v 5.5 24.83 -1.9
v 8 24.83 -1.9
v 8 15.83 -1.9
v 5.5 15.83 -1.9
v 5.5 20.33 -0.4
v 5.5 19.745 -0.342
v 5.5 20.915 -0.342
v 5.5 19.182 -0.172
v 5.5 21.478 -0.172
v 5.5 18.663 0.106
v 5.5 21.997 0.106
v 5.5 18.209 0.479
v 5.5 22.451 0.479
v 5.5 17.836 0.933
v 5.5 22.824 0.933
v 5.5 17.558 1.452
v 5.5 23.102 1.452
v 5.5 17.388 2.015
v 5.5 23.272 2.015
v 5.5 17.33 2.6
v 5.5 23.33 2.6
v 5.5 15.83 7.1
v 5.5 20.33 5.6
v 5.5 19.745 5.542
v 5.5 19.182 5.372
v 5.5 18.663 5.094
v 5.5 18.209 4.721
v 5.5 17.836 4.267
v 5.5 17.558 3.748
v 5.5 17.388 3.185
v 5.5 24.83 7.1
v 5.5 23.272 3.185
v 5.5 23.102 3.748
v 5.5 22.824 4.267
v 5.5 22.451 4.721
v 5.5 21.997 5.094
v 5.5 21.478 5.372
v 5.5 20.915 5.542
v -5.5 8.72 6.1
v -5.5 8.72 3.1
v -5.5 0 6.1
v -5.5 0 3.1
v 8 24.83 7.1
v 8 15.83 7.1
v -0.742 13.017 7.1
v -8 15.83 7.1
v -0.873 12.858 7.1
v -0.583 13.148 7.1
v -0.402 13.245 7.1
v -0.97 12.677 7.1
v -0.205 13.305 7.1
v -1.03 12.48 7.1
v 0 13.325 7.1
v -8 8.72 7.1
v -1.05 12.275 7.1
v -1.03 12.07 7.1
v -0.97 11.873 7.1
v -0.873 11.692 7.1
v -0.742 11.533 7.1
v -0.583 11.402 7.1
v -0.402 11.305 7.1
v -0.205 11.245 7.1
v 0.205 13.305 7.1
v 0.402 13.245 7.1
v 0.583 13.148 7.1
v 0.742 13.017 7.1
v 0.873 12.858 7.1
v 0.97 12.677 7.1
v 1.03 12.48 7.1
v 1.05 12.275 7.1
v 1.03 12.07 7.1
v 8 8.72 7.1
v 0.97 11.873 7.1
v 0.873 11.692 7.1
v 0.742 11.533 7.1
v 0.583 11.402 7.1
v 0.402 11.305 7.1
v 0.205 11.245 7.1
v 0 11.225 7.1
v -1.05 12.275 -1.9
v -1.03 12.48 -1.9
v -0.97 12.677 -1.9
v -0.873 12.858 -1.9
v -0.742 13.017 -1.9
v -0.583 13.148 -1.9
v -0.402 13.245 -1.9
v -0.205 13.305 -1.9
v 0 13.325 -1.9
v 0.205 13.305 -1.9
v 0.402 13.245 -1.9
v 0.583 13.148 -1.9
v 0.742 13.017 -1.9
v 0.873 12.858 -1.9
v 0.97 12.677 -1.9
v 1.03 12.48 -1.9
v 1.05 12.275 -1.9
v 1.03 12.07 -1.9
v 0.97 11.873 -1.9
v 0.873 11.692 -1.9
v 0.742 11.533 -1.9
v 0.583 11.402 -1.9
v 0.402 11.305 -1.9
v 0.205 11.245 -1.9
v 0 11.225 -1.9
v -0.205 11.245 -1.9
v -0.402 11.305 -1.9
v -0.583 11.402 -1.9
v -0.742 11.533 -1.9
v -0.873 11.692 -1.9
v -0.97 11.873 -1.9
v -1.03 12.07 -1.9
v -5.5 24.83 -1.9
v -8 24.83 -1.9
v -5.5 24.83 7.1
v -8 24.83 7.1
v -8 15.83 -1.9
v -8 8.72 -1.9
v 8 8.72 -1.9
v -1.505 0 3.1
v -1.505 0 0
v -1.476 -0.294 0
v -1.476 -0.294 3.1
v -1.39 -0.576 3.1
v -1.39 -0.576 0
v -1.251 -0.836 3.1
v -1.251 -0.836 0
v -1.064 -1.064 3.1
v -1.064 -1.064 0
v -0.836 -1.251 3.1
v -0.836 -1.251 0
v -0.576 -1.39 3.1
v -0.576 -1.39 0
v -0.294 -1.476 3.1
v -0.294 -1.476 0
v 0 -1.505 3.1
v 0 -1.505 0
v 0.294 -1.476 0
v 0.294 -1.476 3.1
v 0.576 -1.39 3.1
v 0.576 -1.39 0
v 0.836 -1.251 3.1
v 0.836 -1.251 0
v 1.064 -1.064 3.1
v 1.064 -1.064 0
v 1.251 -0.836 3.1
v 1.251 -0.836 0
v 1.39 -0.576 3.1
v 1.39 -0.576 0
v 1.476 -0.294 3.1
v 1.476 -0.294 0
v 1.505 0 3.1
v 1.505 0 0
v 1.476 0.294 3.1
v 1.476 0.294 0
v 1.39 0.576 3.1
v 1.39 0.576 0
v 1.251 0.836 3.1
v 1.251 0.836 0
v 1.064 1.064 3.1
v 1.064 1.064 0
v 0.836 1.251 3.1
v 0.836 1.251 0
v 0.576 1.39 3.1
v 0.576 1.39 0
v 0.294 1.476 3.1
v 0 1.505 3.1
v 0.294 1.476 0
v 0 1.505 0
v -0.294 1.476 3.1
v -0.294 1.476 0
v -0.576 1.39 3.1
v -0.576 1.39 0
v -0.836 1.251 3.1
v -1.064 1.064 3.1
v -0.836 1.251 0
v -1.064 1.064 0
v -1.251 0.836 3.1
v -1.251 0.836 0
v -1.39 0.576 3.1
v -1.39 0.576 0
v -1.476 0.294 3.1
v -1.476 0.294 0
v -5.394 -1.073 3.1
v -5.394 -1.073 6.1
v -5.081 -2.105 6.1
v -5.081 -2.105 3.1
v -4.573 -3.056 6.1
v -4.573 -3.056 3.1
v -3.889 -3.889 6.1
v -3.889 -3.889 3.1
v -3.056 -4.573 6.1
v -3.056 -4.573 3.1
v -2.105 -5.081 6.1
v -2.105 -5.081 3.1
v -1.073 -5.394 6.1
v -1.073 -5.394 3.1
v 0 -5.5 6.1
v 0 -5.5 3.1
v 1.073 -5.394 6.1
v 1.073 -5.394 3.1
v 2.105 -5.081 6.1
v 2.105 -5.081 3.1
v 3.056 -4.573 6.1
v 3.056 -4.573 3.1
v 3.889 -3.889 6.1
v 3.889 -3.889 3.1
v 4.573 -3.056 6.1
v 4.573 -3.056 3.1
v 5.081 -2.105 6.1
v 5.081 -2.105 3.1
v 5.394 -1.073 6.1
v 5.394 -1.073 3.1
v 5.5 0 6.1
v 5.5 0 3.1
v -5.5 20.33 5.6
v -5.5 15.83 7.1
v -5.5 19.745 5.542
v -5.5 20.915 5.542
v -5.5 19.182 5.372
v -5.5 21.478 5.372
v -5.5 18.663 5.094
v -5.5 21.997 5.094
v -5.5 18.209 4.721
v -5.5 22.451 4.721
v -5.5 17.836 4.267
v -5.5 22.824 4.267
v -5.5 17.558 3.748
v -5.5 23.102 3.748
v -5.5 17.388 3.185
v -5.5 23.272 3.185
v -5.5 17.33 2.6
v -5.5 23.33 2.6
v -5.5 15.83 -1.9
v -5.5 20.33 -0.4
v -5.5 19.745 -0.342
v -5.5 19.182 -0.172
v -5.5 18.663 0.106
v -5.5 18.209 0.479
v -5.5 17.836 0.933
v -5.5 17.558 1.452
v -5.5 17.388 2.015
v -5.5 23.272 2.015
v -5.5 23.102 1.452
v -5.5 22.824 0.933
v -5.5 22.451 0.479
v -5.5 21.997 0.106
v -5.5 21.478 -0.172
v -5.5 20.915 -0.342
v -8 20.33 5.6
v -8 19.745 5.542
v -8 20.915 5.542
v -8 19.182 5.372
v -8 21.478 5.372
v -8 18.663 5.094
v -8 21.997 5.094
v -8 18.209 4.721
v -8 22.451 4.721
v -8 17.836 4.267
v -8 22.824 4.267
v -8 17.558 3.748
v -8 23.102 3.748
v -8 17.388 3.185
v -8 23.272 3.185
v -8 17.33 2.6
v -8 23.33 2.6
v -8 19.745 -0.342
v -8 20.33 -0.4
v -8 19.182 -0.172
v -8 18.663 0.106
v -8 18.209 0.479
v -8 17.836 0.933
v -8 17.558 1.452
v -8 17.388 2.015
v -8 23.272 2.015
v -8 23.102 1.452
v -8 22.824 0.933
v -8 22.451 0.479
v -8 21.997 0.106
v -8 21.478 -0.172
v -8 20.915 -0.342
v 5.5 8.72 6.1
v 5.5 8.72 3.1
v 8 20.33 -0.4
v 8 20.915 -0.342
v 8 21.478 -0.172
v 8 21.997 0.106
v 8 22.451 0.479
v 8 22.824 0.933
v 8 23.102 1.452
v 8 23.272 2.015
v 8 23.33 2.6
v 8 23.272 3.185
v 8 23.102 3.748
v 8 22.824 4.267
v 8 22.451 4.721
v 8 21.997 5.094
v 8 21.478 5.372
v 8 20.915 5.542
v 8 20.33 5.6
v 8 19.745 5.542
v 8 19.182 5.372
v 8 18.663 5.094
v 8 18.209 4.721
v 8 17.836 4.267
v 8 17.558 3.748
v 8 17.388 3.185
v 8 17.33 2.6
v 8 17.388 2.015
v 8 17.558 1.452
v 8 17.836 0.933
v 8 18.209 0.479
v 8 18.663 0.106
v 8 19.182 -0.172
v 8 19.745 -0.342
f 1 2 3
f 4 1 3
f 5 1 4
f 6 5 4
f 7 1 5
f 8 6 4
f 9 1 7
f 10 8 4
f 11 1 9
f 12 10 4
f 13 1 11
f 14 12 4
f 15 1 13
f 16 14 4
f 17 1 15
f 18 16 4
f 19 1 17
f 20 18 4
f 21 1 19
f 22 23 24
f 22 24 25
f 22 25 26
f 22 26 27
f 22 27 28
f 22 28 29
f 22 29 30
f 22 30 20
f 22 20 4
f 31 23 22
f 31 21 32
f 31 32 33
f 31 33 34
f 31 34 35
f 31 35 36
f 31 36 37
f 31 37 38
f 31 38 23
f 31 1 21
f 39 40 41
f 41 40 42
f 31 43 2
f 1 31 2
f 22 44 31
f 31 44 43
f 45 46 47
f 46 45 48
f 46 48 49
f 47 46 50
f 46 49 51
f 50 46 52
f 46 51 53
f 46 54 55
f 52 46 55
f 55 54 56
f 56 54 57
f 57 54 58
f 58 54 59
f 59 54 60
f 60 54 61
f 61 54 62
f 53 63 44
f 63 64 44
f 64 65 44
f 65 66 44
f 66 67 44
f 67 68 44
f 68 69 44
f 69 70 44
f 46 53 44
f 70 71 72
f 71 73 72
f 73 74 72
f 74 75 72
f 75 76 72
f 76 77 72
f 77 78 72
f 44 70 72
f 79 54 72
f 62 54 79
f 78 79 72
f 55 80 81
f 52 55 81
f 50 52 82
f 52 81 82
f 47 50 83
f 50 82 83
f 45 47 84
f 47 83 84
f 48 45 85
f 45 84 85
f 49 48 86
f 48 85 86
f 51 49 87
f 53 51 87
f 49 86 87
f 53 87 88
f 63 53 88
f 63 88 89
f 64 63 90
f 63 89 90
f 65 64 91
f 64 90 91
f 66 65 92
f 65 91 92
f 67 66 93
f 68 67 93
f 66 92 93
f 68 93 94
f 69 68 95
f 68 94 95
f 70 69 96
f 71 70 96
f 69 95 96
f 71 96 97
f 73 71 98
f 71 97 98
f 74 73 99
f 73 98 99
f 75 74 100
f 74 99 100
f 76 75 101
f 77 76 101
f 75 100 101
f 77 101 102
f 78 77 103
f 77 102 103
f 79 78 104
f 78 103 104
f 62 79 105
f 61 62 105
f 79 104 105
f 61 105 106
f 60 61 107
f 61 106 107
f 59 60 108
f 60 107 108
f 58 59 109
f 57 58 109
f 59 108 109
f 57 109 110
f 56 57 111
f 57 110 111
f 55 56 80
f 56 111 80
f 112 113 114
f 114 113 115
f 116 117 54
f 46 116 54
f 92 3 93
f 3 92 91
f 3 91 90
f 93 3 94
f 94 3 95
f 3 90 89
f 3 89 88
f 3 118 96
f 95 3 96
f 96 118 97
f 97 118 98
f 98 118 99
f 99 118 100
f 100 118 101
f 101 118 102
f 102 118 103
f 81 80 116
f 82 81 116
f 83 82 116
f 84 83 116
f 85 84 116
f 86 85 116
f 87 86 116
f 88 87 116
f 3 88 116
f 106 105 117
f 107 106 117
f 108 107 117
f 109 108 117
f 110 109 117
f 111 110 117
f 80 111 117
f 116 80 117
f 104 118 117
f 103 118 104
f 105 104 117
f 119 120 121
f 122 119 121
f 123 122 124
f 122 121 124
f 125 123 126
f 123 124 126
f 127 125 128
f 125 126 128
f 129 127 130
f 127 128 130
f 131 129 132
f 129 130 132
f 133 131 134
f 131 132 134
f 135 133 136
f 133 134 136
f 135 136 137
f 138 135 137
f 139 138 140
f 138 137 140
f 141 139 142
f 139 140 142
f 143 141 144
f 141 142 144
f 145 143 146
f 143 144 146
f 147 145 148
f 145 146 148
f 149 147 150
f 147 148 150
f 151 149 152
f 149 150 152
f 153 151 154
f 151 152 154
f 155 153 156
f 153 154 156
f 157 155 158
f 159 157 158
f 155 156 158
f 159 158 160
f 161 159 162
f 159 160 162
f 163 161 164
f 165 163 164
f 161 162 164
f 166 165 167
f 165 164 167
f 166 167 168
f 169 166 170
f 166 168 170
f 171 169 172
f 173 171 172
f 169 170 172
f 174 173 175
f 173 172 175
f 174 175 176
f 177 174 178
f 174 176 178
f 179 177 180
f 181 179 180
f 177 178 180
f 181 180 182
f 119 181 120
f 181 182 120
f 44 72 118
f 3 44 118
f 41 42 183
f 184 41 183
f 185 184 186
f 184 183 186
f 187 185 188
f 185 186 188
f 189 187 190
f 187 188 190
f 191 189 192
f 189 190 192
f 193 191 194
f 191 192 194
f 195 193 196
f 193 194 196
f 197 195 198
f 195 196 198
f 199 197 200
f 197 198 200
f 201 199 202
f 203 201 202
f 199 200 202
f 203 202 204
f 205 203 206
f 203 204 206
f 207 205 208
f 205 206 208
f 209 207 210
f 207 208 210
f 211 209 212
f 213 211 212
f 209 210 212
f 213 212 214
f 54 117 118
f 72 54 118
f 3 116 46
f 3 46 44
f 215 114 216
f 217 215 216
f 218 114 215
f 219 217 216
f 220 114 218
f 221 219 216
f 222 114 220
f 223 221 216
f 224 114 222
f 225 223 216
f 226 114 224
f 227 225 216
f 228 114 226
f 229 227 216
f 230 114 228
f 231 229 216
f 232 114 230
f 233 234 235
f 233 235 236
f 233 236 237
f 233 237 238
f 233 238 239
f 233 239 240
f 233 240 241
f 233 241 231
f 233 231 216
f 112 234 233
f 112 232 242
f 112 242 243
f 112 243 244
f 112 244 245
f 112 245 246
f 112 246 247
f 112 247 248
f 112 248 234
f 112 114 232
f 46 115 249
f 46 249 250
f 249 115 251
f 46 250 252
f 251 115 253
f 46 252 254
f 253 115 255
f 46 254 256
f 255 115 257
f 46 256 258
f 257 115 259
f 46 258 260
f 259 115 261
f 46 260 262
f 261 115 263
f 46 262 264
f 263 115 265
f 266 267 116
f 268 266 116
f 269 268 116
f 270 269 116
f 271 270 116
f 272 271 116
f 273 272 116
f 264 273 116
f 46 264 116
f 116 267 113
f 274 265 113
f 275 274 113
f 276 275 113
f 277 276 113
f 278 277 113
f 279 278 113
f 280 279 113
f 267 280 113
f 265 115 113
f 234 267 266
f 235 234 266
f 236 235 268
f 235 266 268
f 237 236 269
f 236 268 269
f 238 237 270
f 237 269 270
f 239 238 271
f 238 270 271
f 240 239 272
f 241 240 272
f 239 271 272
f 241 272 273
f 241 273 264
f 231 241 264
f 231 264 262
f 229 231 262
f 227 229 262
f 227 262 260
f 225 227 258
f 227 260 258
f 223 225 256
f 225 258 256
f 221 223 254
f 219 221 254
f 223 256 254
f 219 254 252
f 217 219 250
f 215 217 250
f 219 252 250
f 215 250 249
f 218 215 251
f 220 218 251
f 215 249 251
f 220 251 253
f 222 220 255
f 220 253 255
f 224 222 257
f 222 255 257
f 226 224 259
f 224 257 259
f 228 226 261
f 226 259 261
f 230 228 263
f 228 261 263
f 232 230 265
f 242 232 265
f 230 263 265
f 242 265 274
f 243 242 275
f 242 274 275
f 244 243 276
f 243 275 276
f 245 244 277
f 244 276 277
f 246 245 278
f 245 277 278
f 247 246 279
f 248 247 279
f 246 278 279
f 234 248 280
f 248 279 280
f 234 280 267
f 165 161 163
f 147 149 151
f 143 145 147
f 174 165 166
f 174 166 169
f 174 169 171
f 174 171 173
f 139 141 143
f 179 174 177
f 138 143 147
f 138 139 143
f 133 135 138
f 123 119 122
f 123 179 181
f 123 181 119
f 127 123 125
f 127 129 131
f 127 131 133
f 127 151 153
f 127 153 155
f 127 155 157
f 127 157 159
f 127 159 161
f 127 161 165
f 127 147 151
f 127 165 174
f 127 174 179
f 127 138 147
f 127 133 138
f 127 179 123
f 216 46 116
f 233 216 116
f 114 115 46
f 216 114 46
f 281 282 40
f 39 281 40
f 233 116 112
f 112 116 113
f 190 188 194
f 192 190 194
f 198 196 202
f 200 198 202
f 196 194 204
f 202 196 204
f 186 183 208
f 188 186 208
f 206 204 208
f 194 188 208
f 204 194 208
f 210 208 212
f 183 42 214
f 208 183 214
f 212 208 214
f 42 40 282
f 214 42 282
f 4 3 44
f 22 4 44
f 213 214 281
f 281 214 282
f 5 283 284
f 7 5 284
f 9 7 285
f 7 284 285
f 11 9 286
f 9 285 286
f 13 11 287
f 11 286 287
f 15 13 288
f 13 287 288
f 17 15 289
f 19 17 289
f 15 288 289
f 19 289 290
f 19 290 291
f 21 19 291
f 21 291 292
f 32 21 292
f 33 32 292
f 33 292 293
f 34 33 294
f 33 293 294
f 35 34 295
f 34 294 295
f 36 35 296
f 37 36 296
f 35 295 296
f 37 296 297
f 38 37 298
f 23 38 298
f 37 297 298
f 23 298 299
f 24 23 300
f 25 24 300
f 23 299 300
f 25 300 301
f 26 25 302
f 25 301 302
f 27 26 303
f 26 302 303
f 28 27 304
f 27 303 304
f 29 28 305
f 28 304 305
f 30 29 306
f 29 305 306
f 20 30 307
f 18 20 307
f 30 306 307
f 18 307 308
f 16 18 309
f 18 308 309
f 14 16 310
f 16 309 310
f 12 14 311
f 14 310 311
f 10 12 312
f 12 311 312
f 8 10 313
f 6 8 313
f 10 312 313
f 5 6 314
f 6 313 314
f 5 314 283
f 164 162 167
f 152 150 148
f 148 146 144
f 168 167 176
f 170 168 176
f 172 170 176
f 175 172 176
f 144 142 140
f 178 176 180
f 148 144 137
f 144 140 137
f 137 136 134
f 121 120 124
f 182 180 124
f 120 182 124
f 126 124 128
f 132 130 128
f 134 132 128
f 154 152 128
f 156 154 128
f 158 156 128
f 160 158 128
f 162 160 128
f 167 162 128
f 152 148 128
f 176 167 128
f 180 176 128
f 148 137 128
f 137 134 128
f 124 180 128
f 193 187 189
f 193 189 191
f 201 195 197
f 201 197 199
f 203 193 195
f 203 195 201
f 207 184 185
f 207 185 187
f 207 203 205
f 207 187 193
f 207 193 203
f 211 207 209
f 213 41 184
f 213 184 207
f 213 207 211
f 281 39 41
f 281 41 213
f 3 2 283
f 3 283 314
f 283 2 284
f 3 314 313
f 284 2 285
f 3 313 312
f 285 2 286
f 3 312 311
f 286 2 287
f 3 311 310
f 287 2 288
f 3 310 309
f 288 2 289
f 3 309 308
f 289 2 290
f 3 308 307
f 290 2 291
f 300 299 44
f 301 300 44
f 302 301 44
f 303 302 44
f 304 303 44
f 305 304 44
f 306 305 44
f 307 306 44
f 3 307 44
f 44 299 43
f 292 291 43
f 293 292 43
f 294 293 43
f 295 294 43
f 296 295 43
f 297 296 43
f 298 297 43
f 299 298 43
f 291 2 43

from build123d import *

# Parameters (mm, degrees)
SKETCH1_R           = 1.505
BOSS_EXTRUDE1_DEPTH = 3.1
SKETCH2_R           = 5.5
SKETCH2_R_2         = 1.505
BOSS_EXTRUDE2_DEPTH = 3
SKETCH3_W           = 11
SKETCH3_H           = 3
BOSS_EXTRUDE4_DEPTH = 7.11
F_3DSKETCH1_R       = 3
BOSS_EXTRUDE5_DEPTH = 2.5
F_3DSKETCH2_R       = 3
BOSS_EXTRUDE6_DEPTH = 2.5
SKETCH4_R           = 1.05
CUT_EXTRUDE1_DEPTH  = 9


with BuildPart() as part:
    # Sketch1 → Boss-Extrude1 (new body)
    with BuildSketch(Plane.XY):
        with Locations(Location((0, 0, 0), (0, 0, 180))):
            Circle(SKETCH1_R)
    extrude(amount=BOSS_EXTRUDE1_DEPTH)


with BuildPart() as body_2:
    # Sketch2 → Boss-Extrude2 (new body)
    # profile 1 of 3: a face of its own
    with BuildSketch(Plane.XY.offset(3.1)):
        Circle(SKETCH2_R)
        with Locations(Location((0, 0, 0), (0, 0, 180))):
            Circle(SKETCH2_R_2, mode=Mode.SUBTRACT)
    # profile 2 of 3: a face of its own
    with BuildSketch(Plane.XY.offset(3.1)):
        with Locations(Location((0, 0, 0), (0, 0, 180))):
            Circle(SKETCH2_R_2)
    # profile 3 of 3: a face of its own
    with BuildSketch(Plane.XY.offset(3.1)):
        with BuildLine():
            Line((-5.5, 8.72), (-5.5, 0))
            ThreePointArc((-5.5, 0), (0, 5.5), (5.5, 0))
            Line((5.5, 0), (5.5, 8.72))
            Line((5.5, 8.72), (-5.5, 8.72))
        make_face()
    extrude(amount=BOSS_EXTRUDE2_DEPTH)


with BuildPart() as body_3:
    # Sketch3 → Boss-Extrude4 (new body)
    with BuildSketch(Plane(origin=(0, 8.72, 0), x_dir=(1, 0, 0), z_dir=(0, 1, 0))):
        with Locations((0, -4.6)):
            Rectangle(SKETCH3_W, SKETCH3_H)
        Polygon((5.5, -6.1), (8, -6.1), (8, 1.9), (-8, 1.9), (-8, -6.1), (-5.5, -6.1), (-5.5, -3.1), (5.5, -3.1), align=None)
        Polygon((-8, -6.1), (-8, -7.1), (8, -7.1), (8, -6.1), (5.5, -6.1), (-5.5, -6.1), align=None)
    extrude(amount=BOSS_EXTRUDE4_DEPTH)

    # Sketch4 → Cut-Extrude1 (cut)
    with BuildSketch(Plane(origin=(0, 0, -1.9), x_dir=(-1, 0, 0), z_dir=(0, 0, -1))):
        with Locations((0, 12.275)):
            Circle(SKETCH4_R)
    extrude(amount=-CUT_EXTRUDE1_DEPTH, mode=Mode.SUBTRACT)


with BuildPart() as body_4:
    # 3DSketch1 → Boss-Extrude5 (new body)
    with BuildSketch(Plane(origin=(-8, 15.83, -1.9), x_dir=(0, 0.7071067811865475, 0.7071067811865476), z_dir=(-1, 0, 0))):
        Polygon((0, 0), (6.363961031, 6.363961031), (12.727922061, 0), (6.363961031, -6.363961031), align=None)
        with Locations(Location((6.363961031, 0, 0), (0, 0, 135))):
            Circle(F_3DSKETCH1_R, mode=Mode.SUBTRACT)
    extrude(amount=-BOSS_EXTRUDE5_DEPTH)


with BuildPart() as body_5:
    # 3DSketch2 → Boss-Extrude6 (new body)
    with BuildSketch(Plane(origin=(8, 15.83, 7.1), x_dir=(0, 0.7071067811865475, -0.7071067811865476), z_dir=(1, 0, 0))):
        Polygon((0, 0), (6.363961031, 6.363961031), (12.727922061, 0), (6.363961031, -6.363961031), align=None)
        with Locations(Location((6.363961031, 0, 0), (0, 0, 315))):
            Circle(F_3DSKETCH2_R, mode=Mode.SUBTRACT)
    extrude(amount=-BOSS_EXTRUDE6_DEPTH)


solid = Compound([part.part, body_2.part, body_3.part, body_4.part, body_5.part])
